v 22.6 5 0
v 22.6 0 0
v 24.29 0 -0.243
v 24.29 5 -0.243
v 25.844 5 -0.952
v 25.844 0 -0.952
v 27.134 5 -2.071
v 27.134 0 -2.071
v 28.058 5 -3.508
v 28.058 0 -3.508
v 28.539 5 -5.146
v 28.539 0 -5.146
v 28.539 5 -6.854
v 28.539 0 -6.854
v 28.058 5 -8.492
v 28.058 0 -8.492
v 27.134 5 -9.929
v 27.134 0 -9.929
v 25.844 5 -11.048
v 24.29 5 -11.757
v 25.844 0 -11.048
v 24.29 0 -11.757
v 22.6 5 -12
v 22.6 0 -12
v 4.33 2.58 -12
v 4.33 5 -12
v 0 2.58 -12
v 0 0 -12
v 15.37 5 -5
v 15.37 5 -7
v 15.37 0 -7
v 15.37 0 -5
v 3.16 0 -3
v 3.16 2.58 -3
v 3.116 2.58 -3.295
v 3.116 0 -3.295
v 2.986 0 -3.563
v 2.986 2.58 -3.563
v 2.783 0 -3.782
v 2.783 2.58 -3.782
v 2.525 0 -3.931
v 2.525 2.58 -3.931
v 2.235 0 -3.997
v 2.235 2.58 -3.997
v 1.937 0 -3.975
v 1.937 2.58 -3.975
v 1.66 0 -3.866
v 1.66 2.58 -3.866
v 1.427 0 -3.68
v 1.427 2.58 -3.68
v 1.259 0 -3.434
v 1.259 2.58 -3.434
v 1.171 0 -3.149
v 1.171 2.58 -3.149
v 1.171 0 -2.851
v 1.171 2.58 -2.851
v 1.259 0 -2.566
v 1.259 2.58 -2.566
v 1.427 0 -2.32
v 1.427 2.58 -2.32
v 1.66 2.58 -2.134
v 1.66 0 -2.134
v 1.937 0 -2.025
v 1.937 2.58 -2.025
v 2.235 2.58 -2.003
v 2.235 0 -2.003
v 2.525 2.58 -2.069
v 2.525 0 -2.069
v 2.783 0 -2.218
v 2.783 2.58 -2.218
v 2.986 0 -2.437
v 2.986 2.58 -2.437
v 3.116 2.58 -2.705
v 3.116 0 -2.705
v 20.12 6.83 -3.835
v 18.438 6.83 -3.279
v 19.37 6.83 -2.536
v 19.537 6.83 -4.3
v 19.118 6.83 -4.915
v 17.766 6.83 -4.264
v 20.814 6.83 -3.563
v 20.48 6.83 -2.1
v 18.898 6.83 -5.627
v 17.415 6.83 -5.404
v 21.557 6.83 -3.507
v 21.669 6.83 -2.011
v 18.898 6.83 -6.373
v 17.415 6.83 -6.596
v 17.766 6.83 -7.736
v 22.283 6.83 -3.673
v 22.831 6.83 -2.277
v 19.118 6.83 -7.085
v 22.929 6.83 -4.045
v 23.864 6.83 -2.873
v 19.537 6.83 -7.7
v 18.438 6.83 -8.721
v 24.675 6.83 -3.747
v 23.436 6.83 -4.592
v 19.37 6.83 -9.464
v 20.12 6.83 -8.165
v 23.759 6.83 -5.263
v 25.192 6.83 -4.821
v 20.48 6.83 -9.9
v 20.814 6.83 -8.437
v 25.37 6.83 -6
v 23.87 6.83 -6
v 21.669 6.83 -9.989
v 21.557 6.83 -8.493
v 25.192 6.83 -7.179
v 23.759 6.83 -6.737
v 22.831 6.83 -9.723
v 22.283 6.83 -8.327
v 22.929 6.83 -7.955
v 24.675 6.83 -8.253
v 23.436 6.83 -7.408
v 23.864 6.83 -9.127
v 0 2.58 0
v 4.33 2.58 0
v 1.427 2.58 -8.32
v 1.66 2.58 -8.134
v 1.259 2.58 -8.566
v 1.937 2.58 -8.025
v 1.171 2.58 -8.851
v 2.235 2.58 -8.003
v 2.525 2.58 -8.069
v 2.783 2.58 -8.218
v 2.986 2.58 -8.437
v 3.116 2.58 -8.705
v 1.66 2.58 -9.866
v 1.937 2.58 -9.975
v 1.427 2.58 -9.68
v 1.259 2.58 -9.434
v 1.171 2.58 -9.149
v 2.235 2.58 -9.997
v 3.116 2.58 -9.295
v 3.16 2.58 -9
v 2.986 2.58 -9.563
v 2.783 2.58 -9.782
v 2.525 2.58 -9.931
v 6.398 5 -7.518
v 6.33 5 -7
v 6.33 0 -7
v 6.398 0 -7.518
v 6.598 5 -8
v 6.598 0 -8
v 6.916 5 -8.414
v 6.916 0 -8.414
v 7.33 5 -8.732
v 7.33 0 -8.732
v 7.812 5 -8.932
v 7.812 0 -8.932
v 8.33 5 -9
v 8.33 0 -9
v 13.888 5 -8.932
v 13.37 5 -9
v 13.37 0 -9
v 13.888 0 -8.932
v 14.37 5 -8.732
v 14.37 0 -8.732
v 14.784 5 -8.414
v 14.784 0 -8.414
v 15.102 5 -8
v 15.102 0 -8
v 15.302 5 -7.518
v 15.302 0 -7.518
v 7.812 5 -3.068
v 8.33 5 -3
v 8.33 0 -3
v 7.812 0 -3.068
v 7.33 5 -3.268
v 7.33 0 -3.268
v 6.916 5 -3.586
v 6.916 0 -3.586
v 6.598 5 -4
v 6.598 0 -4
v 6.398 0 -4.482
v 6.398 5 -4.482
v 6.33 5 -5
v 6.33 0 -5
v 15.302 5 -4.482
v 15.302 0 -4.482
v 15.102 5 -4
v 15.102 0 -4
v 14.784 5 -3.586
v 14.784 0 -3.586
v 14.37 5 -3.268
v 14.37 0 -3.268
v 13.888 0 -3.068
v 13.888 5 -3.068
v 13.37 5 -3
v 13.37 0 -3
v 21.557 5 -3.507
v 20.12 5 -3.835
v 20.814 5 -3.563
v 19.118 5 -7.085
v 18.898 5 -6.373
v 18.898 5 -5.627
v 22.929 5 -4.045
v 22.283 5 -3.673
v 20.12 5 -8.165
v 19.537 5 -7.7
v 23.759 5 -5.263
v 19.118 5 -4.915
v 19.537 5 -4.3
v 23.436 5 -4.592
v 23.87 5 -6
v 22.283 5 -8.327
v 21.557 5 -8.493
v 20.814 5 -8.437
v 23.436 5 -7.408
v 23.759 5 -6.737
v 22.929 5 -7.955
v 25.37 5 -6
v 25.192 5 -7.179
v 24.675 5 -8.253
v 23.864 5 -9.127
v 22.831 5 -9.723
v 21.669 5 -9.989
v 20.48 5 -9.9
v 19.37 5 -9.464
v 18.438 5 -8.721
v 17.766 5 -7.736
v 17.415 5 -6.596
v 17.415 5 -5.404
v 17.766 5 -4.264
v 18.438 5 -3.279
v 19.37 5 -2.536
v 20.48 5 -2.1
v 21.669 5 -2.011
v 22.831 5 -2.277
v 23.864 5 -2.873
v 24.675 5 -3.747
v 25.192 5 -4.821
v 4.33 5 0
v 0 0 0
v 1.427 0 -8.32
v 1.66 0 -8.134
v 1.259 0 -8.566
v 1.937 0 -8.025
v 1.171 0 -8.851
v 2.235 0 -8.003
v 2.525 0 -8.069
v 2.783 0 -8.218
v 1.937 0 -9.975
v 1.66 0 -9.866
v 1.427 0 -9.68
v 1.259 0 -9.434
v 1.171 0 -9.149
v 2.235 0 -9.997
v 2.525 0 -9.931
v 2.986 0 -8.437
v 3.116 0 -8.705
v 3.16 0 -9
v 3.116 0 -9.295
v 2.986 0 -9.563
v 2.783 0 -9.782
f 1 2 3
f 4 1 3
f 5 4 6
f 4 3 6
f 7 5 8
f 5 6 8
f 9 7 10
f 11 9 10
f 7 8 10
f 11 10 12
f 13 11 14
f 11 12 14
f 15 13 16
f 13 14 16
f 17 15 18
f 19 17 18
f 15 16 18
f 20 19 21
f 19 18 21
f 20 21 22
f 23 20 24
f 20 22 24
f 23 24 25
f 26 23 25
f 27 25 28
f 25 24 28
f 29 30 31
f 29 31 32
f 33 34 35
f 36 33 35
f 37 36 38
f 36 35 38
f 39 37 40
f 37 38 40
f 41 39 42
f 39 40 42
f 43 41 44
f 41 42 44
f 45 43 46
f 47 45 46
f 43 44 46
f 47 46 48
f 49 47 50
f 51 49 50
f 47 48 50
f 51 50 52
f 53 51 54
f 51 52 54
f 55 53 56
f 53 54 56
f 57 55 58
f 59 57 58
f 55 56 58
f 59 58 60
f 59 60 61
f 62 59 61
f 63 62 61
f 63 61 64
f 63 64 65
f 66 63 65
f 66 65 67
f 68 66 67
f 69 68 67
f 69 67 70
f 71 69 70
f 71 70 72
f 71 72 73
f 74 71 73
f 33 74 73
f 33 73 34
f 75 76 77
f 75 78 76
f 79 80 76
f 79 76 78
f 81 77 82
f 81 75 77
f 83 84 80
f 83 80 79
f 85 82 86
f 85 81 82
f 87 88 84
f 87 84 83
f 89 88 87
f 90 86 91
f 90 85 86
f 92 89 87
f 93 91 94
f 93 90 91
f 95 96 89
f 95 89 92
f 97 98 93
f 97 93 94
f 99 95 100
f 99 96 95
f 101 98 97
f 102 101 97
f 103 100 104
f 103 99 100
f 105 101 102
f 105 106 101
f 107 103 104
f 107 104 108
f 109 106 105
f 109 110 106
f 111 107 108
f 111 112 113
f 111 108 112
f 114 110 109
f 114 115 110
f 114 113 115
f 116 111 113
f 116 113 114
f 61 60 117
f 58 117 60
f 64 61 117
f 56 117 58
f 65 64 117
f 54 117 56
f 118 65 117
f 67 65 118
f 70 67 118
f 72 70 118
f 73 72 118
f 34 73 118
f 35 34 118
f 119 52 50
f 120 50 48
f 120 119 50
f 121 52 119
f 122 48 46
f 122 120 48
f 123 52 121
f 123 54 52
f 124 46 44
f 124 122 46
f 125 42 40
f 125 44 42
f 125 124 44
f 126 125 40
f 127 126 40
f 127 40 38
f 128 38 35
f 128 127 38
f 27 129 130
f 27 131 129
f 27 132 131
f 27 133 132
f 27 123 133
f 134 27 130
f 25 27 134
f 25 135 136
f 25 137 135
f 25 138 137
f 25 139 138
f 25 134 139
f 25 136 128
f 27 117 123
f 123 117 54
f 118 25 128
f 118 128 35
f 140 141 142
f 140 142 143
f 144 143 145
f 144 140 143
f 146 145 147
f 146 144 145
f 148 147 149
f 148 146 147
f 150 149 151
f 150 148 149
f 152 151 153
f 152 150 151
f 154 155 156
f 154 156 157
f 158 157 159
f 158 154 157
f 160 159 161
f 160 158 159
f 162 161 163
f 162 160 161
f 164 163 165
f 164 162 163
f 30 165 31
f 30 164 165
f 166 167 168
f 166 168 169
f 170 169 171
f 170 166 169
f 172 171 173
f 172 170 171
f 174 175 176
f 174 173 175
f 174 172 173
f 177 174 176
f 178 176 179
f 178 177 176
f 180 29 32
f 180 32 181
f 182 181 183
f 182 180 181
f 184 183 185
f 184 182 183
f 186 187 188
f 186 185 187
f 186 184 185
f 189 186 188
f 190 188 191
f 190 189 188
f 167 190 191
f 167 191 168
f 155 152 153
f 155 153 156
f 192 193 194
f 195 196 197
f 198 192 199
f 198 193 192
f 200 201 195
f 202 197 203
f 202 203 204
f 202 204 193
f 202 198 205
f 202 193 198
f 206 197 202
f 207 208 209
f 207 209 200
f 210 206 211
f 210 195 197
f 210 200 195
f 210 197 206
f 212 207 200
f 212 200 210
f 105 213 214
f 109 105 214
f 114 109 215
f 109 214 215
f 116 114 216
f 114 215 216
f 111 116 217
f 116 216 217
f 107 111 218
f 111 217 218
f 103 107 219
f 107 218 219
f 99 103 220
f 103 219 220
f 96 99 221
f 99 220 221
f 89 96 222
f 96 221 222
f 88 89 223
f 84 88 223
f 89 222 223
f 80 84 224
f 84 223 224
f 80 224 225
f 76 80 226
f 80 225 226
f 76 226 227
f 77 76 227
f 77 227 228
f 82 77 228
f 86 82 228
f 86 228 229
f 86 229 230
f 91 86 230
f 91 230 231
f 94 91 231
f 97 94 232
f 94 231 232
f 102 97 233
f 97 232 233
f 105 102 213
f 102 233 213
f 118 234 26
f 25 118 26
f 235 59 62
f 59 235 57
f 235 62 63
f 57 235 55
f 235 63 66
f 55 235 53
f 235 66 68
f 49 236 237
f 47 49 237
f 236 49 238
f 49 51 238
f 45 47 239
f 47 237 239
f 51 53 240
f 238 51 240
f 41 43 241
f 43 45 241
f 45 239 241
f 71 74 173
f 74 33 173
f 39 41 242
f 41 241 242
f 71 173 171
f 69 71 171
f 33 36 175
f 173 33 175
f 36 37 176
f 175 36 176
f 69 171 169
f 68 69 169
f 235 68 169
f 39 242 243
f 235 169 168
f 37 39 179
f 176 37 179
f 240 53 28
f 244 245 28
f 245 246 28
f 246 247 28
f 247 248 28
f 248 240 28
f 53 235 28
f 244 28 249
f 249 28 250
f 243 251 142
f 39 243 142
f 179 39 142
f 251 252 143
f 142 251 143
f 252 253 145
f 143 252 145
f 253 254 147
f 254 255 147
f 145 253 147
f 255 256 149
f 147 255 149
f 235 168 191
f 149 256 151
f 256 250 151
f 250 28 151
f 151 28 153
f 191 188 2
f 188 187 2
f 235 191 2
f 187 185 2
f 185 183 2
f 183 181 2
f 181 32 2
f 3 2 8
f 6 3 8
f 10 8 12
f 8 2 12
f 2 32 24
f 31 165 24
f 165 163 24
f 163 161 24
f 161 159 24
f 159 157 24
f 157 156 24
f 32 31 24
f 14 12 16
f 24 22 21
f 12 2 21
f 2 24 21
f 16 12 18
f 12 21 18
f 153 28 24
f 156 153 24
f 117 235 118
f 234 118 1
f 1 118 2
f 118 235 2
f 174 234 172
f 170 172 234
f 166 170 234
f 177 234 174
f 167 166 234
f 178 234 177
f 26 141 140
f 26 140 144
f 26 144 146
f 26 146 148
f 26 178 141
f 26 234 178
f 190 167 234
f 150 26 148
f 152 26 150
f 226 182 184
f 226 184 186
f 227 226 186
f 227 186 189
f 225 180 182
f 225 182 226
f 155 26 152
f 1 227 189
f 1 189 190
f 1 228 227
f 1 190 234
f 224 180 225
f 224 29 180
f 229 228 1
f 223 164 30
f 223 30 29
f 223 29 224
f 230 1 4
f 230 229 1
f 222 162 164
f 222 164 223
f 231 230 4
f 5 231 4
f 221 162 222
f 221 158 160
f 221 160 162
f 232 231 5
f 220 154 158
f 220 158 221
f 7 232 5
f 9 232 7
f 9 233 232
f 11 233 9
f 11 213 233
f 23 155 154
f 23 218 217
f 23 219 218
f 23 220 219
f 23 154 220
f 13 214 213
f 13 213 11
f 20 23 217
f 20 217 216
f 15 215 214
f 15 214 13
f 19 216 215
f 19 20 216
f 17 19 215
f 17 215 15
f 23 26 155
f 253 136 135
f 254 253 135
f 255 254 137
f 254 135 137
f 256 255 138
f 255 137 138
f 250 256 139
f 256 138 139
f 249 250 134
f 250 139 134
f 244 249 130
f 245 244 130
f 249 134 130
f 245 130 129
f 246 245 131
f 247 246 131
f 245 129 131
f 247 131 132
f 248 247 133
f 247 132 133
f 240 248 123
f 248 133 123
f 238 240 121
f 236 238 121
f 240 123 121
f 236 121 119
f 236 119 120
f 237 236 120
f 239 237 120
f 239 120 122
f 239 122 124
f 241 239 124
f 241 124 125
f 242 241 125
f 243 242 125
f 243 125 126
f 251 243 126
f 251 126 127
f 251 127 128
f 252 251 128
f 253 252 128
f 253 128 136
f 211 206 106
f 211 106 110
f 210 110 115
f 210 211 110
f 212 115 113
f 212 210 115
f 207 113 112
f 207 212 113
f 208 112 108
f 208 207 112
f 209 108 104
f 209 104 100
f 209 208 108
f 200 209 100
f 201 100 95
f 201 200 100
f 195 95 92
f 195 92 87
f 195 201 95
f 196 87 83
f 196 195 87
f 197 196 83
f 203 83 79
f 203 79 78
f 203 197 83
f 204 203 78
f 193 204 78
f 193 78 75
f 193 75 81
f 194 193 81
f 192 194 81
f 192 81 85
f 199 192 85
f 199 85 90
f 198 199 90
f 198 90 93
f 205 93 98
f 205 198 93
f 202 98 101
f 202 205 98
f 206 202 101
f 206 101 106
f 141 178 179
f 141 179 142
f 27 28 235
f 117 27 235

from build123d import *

# Parameters (mm, degrees)
BOSS_EXTRUDE1_DEPTH = 5
SKETCH2_W           = 4.33
SKETCH2_H           = 12
CUT_EXTRUDE1_DEPTH  = 2.42
SKETCH3_R           = 1
CUT_EXTRUDE2_DEPTH  = 3.58
SKETCH5_R           = 4
SKETCH5_R_2         = 2.5
BOSS_EXTRUDE2_DEPTH = 1.83
CUT_EXTRUDE3_DEPTH  = 6


with BuildPart() as part:
    # Sketch1 → Boss-Extrude1 (new body)
    with BuildSketch(Plane(origin=(0, 0, 0), x_dir=(1, 0, 0), z_dir=(0, 1, 0))):
        with BuildLine():
            Line((0, 0), (22.6, 0))
            ThreePointArc((22.6, 0), (28.6, 6), (22.6, 12))
            Line((22.6, 12), (0, 12))
            Line((0, 12), (0, 0))
        make_face()
    extrude(amount=BOSS_EXTRUDE1_DEPTH)

    # Sketch2 → Cut-Extrude1 (cut)
    with BuildSketch(Plane(origin=(0, 5, 0), x_dir=(1, 0, 0), z_dir=(0, 1, 0))):
        with Locations((2.165, 6)):
            Rectangle(SKETCH2_W, SKETCH2_H)
    extrude(amount=-CUT_EXTRUDE1_DEPTH, mode=Mode.SUBTRACT)

    # Sketch3 → Cut-Extrude2 (cut, through all)
    with BuildSketch(Plane(origin=(0, 2.58, 0), x_dir=(1, 0, 0), z_dir=(0, 1, 0))):
        with Locations((2.16, 9)):
            Circle(SKETCH3_R)
        with Locations((2.16, 3)):
            Circle(SKETCH3_R)
    extrude(amount=-CUT_EXTRUDE2_DEPTH, mode=Mode.SUBTRACT)

    # Sketch5 → Boss-Extrude2 (add)
    with BuildSketch(Plane(origin=(0, 5, 0), x_dir=(1, 0, 0), z_dir=(0, 1, 0))):
        with Locations((21.37, 6)):
            Circle(SKETCH5_R)
        with Locations((21.37, 6)):
            Circle(SKETCH5_R_2, mode=Mode.SUBTRACT)
    extrude(amount=BOSS_EXTRUDE2_DEPTH)

    # Sketch6 → Cut-Extrude3 (cut, through all)
    with BuildSketch(Plane(origin=(0, 5, 0), x_dir=(1, 0, 0), z_dir=(0, 1, 0))):
        with BuildLine():
            Line((8.33, 9), (13.37, 9))
            ThreePointArc((13.37, 9), (14.784213562, 8.414213562), (15.37, 7))
            Line((15.37, 7), (15.37, 5))
            ThreePointArc((15.37, 5), (14.784213562, 3.585786438), (13.37, 3))
            Line((13.37, 3), (8.33, 3))
            ThreePointArc((8.33, 3), (6.915786438, 3.585786438), (6.33, 5))
            Line((6.33, 5), (6.33, 7))
            ThreePointArc((6.33, 7), (6.915786438, 8.414213562), (8.33, 9))
        make_face()
    extrude(amount=-CUT_EXTRUDE3_DEPTH, mode=Mode.SUBTRACT)


solid = part.part
